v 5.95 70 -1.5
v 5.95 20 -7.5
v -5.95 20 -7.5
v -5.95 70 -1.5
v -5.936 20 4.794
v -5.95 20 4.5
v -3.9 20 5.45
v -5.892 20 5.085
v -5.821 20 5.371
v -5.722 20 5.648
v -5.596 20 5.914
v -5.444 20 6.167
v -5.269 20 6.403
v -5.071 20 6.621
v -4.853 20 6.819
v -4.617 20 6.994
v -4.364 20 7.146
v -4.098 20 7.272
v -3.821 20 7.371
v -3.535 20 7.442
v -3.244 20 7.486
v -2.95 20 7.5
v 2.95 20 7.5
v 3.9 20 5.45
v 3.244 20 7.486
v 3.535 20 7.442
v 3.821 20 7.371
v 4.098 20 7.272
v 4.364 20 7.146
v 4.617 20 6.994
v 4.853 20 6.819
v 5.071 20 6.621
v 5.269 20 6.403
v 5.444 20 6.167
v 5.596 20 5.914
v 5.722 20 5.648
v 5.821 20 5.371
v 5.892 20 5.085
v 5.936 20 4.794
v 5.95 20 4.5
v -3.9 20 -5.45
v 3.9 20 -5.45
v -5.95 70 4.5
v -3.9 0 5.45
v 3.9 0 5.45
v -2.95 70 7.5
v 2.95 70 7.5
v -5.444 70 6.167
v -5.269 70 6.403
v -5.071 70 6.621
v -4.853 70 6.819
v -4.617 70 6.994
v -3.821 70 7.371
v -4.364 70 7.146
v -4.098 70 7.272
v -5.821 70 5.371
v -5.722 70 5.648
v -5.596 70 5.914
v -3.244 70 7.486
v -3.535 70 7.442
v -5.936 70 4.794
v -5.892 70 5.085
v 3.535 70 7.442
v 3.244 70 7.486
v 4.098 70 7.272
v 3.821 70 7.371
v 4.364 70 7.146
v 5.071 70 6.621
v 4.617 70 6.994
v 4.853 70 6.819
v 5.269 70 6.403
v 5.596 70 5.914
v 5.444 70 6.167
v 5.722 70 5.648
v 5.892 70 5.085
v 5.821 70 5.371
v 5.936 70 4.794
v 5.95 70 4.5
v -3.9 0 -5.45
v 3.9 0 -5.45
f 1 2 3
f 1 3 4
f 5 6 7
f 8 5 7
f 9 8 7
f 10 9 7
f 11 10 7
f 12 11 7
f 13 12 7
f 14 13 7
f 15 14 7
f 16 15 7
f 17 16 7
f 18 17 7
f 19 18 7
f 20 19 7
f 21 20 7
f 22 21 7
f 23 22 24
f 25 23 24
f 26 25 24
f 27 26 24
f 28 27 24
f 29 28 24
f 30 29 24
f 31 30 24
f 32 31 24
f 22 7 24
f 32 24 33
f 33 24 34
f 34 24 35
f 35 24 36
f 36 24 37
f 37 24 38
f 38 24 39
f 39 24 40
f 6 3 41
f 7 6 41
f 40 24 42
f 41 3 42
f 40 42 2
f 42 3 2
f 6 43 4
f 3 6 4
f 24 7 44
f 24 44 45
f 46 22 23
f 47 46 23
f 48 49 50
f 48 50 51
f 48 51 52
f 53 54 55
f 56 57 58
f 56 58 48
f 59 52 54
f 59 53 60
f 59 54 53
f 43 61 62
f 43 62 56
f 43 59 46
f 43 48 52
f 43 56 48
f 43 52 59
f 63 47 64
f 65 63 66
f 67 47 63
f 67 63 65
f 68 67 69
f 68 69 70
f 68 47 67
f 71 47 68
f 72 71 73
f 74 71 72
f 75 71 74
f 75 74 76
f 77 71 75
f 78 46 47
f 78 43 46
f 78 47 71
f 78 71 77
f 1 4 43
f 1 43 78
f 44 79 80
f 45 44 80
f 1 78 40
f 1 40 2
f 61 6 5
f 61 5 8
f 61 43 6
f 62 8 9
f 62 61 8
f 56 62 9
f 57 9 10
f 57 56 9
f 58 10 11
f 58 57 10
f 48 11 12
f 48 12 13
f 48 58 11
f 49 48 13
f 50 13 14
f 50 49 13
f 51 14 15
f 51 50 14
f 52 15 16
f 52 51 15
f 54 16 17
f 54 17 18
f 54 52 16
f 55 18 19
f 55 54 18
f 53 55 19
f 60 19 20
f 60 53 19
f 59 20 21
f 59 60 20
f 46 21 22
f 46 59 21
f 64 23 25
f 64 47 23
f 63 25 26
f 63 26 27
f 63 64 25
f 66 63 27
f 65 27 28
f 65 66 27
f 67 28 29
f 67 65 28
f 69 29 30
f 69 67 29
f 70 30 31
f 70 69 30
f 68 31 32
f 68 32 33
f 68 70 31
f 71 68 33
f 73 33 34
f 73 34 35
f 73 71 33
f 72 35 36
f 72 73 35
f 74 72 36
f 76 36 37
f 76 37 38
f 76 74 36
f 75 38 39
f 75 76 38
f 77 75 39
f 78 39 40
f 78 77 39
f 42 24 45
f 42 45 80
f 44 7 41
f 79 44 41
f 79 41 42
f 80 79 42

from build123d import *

# Parameters (mm, degrees)
SKETCH1_W               = 7.8
SKETCH1_H               = 10.9
BOSS_EXTRUDE1_DEPTH     = 20
SKETCH2_W               = 11.9
SKETCH2_H               = 15
BOSS_EXTRUDE2_DEPTH     = 50
CUT_EXTRUDE1_DEPTH      = 72.399299716
CUT_EXTRUDE1_DEPTH_BACK = 72.399299716
FILLET1_R               = 3


with BuildPart() as part:
    # Sketch1 → Boss-Extrude1 (new body)
    with BuildSketch(Plane(origin=(0, 0, 0), x_dir=(1, 0, 0), z_dir=(0, 1, 0))):
        Rectangle(SKETCH1_W, SKETCH1_H)
    extrude(amount=BOSS_EXTRUDE1_DEPTH)

    # Sketch2 → Boss-Extrude2 (add)
    with BuildSketch(Plane(origin=(0, 20, 0), x_dir=(1, 0, 0), z_dir=(0, 1, 0))):
        Rectangle(SKETCH2_W, SKETCH2_H)
    extrude(amount=BOSS_EXTRUDE2_DEPTH)

    # Sketch3 → Cut-Extrude1 (cut, two sides: drawn at the far end of the back side and taken through both)
    with BuildSketch(Plane.ZY.offset(5.95).offset(-CUT_EXTRUDE1_DEPTH_BACK)):
        Polygon((-7.5, 20), (-1.5, 70), (-7.5, 70), align=None)
    extrude(amount=CUT_EXTRUDE1_DEPTH + CUT_EXTRUDE1_DEPTH_BACK, mode=Mode.SUBTRACT)

    # Fillet1
    fillet1_edges = [part.edges().sort_by_distance(p)[0] for p in [
        (5.95, 45, 7.5),
        (-5.95, 45, 7.5),
    ]]
    fillet(fillet1_edges, radius=FILLET1_R)


solid = part.part
